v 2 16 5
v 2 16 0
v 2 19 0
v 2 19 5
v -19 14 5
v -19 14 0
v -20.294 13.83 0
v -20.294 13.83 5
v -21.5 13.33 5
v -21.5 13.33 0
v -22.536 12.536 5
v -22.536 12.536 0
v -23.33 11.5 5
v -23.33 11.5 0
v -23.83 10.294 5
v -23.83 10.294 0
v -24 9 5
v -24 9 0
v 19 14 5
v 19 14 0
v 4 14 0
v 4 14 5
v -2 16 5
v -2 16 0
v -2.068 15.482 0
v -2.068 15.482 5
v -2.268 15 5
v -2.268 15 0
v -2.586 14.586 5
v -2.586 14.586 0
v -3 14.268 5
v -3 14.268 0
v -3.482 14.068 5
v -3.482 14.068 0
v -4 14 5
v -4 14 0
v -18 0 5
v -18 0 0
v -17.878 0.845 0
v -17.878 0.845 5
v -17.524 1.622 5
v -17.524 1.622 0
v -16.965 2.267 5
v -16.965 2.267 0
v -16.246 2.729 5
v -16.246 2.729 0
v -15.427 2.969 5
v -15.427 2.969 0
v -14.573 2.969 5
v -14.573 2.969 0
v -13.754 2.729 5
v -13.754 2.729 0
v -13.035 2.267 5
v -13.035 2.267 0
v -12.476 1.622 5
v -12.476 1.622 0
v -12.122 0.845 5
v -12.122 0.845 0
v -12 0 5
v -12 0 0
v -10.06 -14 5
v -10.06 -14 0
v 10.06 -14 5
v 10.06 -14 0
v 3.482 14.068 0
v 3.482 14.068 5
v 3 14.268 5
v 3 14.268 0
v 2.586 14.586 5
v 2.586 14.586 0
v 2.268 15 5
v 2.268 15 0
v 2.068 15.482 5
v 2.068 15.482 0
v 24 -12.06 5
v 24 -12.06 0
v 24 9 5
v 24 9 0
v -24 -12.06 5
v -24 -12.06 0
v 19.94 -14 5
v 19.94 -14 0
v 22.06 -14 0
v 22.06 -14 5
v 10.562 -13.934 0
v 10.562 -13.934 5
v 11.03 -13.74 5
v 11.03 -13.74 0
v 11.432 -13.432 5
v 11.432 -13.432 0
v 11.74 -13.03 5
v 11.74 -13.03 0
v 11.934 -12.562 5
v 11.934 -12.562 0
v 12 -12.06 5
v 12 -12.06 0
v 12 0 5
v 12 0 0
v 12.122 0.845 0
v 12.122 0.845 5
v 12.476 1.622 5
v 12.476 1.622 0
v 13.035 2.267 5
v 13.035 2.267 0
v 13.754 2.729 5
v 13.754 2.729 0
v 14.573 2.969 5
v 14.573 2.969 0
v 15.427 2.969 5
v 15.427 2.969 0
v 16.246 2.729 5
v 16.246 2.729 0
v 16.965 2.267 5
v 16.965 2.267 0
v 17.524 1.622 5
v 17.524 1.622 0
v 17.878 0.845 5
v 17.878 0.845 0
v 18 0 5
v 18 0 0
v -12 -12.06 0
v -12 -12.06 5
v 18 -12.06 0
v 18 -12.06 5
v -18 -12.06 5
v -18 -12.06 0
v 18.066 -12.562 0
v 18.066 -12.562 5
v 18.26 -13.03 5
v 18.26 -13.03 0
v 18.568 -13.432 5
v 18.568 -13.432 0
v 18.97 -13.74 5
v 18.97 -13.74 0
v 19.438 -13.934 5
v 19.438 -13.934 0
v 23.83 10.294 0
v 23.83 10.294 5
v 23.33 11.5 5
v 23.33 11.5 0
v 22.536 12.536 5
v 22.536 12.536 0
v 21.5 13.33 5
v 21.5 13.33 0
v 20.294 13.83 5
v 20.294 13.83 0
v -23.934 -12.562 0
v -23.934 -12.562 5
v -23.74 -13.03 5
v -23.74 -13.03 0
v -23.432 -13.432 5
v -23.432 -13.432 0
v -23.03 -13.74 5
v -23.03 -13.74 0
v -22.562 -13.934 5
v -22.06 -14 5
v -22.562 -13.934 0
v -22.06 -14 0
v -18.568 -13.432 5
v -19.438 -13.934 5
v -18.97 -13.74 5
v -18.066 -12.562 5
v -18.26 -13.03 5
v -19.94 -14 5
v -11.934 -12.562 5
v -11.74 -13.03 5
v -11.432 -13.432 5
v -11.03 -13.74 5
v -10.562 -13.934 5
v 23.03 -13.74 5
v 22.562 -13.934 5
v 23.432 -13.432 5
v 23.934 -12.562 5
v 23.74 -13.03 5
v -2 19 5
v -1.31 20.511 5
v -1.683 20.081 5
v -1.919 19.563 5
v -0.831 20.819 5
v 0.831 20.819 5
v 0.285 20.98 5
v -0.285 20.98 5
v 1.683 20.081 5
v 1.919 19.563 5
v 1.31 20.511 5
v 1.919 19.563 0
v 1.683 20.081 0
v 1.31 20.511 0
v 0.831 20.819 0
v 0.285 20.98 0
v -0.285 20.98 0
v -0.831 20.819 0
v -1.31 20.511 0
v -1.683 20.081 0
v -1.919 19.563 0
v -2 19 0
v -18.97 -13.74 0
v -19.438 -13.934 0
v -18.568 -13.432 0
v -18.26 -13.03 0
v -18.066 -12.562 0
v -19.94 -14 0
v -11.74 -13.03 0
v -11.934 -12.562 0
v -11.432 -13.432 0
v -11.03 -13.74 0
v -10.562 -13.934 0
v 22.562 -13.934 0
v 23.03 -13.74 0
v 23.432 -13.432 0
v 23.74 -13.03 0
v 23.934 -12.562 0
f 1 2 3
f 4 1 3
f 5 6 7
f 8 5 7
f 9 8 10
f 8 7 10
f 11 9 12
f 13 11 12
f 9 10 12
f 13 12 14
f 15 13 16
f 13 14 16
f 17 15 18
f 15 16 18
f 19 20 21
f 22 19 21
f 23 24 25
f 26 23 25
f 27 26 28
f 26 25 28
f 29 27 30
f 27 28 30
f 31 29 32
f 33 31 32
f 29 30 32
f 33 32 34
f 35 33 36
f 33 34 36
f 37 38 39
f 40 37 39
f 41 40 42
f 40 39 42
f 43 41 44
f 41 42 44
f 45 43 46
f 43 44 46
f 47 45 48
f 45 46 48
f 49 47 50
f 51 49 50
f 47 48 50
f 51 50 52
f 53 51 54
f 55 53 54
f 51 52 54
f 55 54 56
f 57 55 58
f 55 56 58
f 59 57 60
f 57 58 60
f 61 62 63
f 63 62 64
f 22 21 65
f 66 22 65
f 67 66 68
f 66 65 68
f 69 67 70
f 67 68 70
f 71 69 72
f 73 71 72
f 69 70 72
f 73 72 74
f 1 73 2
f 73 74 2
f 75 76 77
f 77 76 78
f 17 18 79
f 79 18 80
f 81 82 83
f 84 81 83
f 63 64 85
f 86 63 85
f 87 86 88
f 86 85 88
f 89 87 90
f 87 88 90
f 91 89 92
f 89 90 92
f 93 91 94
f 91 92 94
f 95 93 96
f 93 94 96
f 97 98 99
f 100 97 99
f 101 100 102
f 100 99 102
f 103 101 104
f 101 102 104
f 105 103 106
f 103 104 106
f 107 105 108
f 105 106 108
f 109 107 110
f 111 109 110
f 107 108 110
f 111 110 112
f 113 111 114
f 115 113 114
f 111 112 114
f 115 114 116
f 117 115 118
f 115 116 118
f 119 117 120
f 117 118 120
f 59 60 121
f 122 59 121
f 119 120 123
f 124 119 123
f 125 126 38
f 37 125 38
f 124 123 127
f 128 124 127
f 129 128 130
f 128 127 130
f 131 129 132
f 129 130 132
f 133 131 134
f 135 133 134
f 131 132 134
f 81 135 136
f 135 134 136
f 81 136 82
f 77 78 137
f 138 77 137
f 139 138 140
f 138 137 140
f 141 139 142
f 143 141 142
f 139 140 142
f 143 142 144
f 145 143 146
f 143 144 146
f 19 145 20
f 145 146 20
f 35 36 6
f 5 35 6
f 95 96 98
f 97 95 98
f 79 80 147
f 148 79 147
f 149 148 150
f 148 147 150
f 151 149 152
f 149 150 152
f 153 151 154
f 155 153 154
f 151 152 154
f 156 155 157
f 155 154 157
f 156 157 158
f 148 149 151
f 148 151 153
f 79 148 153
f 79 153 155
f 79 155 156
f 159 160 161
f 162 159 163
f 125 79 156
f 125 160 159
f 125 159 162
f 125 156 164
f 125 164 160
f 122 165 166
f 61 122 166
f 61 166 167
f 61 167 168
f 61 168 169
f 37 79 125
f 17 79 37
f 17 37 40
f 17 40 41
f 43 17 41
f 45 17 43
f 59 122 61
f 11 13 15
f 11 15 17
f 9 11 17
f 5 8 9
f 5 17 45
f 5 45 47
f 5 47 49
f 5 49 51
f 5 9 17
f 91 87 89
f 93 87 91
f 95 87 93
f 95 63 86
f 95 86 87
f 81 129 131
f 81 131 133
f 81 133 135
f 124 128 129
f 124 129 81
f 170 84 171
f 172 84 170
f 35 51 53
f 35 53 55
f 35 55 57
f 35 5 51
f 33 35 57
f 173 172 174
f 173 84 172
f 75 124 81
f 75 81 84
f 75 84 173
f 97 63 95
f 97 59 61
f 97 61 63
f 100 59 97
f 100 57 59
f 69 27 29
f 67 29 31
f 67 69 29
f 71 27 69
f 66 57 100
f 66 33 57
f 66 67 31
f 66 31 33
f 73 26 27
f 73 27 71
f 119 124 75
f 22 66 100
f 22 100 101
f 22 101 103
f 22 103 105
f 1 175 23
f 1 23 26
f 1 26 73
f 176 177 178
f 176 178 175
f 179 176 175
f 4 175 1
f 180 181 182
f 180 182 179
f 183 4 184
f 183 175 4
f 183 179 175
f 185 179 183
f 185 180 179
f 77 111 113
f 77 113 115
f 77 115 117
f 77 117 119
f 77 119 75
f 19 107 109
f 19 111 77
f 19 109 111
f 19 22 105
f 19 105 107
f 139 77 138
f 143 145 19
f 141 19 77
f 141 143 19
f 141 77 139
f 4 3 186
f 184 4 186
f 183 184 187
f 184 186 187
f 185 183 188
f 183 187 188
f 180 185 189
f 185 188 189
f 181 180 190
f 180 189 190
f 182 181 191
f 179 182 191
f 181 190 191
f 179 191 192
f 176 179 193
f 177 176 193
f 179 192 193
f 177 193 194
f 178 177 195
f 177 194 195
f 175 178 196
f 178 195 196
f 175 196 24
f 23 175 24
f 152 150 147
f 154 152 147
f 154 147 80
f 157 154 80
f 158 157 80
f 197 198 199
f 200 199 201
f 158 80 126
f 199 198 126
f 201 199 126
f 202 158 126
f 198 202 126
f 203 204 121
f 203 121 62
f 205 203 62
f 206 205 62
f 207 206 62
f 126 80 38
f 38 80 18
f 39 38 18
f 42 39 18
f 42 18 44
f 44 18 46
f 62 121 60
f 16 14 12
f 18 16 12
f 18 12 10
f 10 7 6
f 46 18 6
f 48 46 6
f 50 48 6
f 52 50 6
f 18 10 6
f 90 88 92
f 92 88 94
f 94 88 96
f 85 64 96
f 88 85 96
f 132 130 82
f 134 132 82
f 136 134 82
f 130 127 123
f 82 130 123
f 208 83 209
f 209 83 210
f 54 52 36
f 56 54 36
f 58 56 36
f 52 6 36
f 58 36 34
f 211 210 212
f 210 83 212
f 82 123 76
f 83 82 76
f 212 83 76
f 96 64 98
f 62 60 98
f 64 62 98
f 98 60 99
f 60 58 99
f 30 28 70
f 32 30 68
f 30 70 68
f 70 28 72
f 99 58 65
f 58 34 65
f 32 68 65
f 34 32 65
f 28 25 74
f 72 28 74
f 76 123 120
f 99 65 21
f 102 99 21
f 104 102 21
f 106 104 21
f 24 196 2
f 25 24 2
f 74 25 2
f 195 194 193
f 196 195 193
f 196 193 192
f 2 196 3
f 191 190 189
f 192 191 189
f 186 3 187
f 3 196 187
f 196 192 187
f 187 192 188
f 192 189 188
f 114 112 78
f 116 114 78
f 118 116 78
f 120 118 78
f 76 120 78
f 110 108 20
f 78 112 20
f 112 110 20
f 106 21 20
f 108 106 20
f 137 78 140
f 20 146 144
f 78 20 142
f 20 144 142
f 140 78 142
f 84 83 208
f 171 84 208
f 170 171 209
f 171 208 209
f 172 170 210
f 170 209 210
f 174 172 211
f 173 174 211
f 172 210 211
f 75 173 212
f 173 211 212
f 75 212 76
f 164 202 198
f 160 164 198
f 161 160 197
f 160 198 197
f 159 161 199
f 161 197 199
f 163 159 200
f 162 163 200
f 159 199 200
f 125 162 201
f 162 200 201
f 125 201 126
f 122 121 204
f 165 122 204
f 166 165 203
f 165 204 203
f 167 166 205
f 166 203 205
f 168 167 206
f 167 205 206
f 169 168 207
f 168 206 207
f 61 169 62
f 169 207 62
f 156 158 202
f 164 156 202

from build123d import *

# Parameters (mm, degrees)
DODANIE_WYCI_GNI_CIE1_DEPTH = 5


with BuildPart() as part:
    # Szkic1 → Dodanie-wyciągnięcie1 (new body)
    with BuildSketch(Plane.XY):
        with BuildLine():
            Line((18, 0), (18, -12.05974013))
            ThreePointArc((18, -12.05974013), (18.568288959, -13.431711041), (19.94025987, -14))
            Line((19.94025987, -14), (22.05974013, -14))
            ThreePointArc((22.05974013, -14), (23.431711041, -13.431711041), (24, -12.05974013))
            Line((24, -12.05974013), (24, 9))
            ThreePointArc((24, 9), (22.535533906, 12.535533906), (19, 14))
            Line((19, 14), (4, 14))
            ThreePointArc((4, 14), (2.585786438, 14.585786438), (2, 16))
            Line((2, 16), (2, 19))
            ThreePointArc((2, 19), (0, 21), (-2, 19))
            Line((-2, 19), (-2, 16))
            ThreePointArc((-2, 16), (-2.585786438, 14.585786438), (-4, 14))
            Line((-4, 14), (-19, 14))
            ThreePointArc((-19, 14), (-22.535533906, 12.535533906), (-24, 9))
            Line((-24, 9), (-24, -12.05974013))
            ThreePointArc((-24, -12.05974013), (-23.431711041, -13.431711041), (-22.05974013, -14))
            Line((-22.05974013, -14), (-19.94025987, -14))
            ThreePointArc((-19.94025987, -14), (-18.568288959, -13.431711041), (-18, -12.05974013))
            Line((-18, -12.05974013), (-18, 0))
            ThreePointArc((-18, 0), (-15, 3), (-12, 0))
            Line((-12, 0), (-12, -12.05974013))
            ThreePointArc((-12, -12.05974013), (-11.431711041, -13.431711041), (-10.05974013, -14))
            Line((-10.05974013, -14), (10.05974013, -14))
            ThreePointArc((10.05974013, -14), (11.431711041, -13.431711041), (12, -12.05974013))
            Line((12, -12.05974013), (12, 0))
            ThreePointArc((12, 0), (15, 3), (18, 0))
        make_face()
    extrude(amount=DODANIE_WYCI_GNI_CIE1_DEPTH)


solid = part.part
